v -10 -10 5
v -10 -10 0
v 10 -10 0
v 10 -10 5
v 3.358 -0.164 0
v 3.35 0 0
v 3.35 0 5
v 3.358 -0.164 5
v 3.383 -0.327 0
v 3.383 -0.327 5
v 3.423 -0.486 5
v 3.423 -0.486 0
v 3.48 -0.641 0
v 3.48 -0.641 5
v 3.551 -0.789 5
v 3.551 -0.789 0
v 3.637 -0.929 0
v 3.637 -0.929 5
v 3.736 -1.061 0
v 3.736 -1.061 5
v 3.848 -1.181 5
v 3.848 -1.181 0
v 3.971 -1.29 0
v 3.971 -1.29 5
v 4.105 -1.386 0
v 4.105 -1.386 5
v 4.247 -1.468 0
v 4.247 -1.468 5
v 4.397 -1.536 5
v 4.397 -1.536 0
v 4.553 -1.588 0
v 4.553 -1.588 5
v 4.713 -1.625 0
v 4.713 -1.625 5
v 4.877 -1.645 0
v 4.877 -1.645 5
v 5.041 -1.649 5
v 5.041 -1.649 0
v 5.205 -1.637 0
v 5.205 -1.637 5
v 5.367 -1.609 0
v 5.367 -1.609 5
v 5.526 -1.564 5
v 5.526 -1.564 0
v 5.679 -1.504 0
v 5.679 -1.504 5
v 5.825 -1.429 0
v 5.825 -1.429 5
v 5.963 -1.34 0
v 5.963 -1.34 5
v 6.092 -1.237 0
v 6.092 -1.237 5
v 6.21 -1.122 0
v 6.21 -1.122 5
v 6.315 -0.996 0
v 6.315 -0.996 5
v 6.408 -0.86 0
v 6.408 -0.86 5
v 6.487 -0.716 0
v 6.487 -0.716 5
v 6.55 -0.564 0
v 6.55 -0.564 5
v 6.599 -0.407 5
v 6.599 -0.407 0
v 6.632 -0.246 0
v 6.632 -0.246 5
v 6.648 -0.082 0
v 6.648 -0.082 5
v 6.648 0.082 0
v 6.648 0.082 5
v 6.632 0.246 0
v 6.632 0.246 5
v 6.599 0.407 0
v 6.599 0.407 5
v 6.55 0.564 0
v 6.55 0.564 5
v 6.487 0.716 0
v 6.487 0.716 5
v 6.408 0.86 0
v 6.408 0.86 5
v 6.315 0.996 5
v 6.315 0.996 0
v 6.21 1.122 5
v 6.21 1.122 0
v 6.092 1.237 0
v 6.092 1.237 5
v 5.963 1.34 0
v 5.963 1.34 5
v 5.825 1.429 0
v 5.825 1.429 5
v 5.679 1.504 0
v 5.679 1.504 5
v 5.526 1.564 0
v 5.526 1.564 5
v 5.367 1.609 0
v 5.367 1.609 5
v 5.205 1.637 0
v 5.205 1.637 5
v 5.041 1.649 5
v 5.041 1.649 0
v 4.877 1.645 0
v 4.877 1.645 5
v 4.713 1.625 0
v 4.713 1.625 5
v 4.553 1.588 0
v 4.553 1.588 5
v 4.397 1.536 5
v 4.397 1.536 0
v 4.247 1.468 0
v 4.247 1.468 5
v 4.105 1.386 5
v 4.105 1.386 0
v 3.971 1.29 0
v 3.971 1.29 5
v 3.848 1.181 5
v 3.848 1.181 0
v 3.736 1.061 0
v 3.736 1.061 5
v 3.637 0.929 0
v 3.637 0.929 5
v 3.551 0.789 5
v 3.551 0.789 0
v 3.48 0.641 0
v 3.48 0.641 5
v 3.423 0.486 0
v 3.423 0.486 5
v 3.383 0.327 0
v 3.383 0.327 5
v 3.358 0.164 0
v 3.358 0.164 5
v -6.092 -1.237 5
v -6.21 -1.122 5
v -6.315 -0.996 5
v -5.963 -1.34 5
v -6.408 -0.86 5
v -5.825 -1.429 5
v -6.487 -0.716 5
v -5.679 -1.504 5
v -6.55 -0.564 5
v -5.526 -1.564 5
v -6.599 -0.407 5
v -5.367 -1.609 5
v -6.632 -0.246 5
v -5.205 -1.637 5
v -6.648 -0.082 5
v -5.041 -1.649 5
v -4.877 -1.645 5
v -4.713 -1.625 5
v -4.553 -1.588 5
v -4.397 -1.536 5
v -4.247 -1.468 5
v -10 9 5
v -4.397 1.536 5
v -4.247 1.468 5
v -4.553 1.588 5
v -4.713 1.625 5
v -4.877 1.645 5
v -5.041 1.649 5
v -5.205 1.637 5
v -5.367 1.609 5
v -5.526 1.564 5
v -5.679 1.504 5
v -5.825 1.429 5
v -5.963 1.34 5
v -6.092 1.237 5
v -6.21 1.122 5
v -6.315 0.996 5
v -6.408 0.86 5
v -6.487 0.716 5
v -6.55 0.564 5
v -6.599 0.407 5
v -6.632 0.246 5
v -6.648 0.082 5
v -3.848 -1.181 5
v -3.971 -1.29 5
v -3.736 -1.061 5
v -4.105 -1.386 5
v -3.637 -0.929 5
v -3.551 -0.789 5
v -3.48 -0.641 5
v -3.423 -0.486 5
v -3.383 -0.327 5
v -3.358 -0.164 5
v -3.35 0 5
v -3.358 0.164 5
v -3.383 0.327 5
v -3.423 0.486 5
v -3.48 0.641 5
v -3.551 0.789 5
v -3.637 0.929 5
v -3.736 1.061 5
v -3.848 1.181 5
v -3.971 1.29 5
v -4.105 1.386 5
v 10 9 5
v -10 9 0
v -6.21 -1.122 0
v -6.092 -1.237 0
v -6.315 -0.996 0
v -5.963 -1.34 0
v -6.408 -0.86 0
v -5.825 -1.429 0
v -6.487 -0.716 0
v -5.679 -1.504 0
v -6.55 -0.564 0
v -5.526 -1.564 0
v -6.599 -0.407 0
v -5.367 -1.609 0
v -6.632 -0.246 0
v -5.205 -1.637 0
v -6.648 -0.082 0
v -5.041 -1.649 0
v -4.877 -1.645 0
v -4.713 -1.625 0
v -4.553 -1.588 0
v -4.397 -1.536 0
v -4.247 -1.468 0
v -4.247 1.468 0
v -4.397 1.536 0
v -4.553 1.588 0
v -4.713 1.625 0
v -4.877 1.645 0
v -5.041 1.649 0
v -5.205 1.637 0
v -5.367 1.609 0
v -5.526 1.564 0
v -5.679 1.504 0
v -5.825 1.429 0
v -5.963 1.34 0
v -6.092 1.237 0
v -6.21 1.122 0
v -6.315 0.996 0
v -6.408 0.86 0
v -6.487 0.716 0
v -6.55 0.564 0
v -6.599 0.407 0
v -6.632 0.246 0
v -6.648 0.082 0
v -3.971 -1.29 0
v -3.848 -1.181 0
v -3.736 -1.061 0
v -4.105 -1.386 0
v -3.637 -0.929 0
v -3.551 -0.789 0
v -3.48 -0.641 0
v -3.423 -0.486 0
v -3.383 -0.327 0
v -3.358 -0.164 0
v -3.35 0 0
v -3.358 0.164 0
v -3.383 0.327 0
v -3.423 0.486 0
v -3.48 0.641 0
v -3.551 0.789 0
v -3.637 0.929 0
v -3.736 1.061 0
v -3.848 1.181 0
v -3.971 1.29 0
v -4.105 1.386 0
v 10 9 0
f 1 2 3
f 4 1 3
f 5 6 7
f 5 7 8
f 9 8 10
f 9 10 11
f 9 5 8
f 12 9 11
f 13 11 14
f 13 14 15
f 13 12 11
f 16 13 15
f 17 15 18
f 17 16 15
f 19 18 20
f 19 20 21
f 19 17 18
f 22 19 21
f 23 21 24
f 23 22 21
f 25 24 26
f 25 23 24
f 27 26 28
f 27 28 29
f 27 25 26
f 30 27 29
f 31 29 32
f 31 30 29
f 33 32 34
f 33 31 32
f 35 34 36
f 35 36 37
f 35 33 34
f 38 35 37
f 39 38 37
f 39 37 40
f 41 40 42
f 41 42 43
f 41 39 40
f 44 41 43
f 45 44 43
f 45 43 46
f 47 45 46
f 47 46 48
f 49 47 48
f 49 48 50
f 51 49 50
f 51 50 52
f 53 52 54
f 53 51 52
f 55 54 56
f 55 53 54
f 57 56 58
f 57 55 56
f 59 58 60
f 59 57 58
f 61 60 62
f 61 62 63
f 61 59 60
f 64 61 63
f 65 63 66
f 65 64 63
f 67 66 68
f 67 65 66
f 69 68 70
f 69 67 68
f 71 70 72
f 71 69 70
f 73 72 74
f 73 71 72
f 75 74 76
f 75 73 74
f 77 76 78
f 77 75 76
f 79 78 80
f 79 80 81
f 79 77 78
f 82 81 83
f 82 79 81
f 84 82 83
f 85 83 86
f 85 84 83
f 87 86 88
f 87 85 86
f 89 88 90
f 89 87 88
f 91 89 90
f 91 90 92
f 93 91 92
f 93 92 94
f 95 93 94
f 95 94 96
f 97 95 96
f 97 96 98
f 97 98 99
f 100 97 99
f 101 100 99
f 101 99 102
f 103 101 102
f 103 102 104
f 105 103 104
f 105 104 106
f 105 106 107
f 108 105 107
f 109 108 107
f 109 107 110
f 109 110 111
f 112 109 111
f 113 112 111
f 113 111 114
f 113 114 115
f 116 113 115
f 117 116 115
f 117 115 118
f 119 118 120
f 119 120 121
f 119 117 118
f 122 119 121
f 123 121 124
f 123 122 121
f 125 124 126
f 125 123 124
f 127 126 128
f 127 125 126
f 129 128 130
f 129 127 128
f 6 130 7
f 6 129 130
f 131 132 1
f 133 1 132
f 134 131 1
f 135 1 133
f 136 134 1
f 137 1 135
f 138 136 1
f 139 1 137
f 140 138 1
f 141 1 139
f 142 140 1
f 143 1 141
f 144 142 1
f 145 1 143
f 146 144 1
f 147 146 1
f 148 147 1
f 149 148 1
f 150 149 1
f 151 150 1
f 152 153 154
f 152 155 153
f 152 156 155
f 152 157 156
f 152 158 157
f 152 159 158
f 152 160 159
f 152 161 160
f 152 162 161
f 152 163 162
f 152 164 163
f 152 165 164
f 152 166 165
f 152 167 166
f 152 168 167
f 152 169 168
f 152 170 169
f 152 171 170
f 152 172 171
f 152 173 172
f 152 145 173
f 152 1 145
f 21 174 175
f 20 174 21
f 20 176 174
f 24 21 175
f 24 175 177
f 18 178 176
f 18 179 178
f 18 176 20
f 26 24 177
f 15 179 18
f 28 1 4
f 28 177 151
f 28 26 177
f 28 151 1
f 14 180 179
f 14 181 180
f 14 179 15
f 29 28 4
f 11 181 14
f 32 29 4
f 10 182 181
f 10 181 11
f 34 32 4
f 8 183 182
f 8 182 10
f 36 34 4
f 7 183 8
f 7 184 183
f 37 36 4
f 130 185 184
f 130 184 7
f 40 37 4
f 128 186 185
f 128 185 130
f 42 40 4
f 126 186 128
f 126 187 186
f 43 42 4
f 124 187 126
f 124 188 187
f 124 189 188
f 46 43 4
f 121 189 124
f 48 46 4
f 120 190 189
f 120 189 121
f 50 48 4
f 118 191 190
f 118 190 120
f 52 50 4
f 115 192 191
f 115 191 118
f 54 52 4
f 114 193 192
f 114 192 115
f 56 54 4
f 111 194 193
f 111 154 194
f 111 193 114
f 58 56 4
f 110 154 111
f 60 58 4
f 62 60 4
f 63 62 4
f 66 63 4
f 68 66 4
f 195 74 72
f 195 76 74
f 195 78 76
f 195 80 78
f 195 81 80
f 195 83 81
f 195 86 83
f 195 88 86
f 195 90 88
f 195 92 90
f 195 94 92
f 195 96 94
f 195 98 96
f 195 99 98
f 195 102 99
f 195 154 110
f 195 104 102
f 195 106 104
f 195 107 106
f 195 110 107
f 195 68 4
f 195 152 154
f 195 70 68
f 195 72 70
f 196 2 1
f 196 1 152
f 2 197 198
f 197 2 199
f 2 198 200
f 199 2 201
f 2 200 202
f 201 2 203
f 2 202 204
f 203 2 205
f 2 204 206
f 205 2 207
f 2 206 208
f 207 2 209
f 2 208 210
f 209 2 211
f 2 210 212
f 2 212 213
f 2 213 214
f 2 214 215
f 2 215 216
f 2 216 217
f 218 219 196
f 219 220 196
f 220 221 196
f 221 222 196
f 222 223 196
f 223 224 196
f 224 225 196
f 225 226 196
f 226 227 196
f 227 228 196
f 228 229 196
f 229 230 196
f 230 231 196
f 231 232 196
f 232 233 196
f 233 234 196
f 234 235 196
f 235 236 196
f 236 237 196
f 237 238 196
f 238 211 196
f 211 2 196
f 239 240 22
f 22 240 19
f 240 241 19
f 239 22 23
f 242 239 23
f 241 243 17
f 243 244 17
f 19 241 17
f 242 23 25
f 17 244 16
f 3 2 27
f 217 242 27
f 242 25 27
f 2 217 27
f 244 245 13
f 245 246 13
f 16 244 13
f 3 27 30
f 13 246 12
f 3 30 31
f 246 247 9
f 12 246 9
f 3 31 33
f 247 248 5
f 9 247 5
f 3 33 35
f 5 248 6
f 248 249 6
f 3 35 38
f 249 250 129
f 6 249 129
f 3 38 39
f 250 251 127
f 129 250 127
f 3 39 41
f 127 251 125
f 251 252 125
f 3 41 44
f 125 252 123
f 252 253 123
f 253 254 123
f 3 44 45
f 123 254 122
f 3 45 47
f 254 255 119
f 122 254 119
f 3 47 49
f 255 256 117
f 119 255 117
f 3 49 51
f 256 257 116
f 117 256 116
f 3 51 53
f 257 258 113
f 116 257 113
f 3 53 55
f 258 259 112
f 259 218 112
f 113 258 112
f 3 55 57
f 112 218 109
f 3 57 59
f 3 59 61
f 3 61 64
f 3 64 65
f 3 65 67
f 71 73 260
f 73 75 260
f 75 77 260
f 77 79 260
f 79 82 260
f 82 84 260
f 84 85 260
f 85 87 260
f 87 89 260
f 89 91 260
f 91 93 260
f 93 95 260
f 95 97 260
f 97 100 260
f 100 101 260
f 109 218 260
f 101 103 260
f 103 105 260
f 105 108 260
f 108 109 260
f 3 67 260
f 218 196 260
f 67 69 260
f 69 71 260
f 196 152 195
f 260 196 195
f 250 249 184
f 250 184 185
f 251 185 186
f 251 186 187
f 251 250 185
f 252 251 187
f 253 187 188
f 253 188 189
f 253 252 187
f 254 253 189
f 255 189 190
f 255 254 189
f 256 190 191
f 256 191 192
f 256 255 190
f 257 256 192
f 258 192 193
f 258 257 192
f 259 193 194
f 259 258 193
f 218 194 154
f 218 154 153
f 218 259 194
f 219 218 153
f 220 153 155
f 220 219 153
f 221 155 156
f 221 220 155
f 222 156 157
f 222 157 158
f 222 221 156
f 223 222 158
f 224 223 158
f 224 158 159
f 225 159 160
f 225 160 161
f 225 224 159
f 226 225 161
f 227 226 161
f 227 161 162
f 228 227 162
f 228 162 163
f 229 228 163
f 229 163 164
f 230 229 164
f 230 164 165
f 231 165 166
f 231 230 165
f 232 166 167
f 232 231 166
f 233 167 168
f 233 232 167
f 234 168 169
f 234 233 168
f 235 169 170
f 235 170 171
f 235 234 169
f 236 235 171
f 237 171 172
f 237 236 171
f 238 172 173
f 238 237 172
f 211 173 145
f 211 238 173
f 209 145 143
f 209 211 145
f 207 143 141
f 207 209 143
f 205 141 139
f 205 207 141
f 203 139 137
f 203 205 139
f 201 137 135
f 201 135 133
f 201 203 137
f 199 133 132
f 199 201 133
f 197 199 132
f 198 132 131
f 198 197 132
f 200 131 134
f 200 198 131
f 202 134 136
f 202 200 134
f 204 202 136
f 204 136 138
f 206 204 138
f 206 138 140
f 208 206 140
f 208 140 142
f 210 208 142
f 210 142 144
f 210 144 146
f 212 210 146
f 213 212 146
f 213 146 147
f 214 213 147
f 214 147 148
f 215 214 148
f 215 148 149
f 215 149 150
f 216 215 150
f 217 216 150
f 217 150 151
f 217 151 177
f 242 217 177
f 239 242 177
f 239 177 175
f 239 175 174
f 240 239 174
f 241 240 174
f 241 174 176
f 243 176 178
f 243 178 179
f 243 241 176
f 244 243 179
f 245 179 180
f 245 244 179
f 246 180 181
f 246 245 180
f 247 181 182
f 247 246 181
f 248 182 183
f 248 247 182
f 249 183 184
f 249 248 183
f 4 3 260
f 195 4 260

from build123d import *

# Parameters (mm, degrees)
SKETCH_1_W          = 20
SKETCH_1_H          = 20
SKETCH_1_R          = 1.65
EXTRUDE_1_DEPTH     = 5
SKETCH_2_W          = 20
SKETCH_2_H          = 1
CUT_EXTRUDE_1_DEPTH = 5


with BuildPart() as part:
    # 草图1 → 凸台-拉伸1 (new body)
    with BuildSketch(Plane.XY):
        Rectangle(SKETCH_1_W, SKETCH_1_H)
        with Locations((-5, 0)):
            Circle(SKETCH_1_R, mode=Mode.SUBTRACT)
        with Locations(Location((5, 0, 0), (0, 0, 180))):
            Circle(SKETCH_1_R, mode=Mode.SUBTRACT)
    extrude(amount=EXTRUDE_1_DEPTH)

    # 草图2 → 切除-拉伸1 (cut)
    with BuildSketch(Plane.XY.offset(5)):
        with Locations((0, 9.5)):
            Rectangle(SKETCH_2_W, SKETCH_2_H)
    extrude(amount=-CUT_EXTRUDE_1_DEPTH, mode=Mode.SUBTRACT)


solid = part.part
